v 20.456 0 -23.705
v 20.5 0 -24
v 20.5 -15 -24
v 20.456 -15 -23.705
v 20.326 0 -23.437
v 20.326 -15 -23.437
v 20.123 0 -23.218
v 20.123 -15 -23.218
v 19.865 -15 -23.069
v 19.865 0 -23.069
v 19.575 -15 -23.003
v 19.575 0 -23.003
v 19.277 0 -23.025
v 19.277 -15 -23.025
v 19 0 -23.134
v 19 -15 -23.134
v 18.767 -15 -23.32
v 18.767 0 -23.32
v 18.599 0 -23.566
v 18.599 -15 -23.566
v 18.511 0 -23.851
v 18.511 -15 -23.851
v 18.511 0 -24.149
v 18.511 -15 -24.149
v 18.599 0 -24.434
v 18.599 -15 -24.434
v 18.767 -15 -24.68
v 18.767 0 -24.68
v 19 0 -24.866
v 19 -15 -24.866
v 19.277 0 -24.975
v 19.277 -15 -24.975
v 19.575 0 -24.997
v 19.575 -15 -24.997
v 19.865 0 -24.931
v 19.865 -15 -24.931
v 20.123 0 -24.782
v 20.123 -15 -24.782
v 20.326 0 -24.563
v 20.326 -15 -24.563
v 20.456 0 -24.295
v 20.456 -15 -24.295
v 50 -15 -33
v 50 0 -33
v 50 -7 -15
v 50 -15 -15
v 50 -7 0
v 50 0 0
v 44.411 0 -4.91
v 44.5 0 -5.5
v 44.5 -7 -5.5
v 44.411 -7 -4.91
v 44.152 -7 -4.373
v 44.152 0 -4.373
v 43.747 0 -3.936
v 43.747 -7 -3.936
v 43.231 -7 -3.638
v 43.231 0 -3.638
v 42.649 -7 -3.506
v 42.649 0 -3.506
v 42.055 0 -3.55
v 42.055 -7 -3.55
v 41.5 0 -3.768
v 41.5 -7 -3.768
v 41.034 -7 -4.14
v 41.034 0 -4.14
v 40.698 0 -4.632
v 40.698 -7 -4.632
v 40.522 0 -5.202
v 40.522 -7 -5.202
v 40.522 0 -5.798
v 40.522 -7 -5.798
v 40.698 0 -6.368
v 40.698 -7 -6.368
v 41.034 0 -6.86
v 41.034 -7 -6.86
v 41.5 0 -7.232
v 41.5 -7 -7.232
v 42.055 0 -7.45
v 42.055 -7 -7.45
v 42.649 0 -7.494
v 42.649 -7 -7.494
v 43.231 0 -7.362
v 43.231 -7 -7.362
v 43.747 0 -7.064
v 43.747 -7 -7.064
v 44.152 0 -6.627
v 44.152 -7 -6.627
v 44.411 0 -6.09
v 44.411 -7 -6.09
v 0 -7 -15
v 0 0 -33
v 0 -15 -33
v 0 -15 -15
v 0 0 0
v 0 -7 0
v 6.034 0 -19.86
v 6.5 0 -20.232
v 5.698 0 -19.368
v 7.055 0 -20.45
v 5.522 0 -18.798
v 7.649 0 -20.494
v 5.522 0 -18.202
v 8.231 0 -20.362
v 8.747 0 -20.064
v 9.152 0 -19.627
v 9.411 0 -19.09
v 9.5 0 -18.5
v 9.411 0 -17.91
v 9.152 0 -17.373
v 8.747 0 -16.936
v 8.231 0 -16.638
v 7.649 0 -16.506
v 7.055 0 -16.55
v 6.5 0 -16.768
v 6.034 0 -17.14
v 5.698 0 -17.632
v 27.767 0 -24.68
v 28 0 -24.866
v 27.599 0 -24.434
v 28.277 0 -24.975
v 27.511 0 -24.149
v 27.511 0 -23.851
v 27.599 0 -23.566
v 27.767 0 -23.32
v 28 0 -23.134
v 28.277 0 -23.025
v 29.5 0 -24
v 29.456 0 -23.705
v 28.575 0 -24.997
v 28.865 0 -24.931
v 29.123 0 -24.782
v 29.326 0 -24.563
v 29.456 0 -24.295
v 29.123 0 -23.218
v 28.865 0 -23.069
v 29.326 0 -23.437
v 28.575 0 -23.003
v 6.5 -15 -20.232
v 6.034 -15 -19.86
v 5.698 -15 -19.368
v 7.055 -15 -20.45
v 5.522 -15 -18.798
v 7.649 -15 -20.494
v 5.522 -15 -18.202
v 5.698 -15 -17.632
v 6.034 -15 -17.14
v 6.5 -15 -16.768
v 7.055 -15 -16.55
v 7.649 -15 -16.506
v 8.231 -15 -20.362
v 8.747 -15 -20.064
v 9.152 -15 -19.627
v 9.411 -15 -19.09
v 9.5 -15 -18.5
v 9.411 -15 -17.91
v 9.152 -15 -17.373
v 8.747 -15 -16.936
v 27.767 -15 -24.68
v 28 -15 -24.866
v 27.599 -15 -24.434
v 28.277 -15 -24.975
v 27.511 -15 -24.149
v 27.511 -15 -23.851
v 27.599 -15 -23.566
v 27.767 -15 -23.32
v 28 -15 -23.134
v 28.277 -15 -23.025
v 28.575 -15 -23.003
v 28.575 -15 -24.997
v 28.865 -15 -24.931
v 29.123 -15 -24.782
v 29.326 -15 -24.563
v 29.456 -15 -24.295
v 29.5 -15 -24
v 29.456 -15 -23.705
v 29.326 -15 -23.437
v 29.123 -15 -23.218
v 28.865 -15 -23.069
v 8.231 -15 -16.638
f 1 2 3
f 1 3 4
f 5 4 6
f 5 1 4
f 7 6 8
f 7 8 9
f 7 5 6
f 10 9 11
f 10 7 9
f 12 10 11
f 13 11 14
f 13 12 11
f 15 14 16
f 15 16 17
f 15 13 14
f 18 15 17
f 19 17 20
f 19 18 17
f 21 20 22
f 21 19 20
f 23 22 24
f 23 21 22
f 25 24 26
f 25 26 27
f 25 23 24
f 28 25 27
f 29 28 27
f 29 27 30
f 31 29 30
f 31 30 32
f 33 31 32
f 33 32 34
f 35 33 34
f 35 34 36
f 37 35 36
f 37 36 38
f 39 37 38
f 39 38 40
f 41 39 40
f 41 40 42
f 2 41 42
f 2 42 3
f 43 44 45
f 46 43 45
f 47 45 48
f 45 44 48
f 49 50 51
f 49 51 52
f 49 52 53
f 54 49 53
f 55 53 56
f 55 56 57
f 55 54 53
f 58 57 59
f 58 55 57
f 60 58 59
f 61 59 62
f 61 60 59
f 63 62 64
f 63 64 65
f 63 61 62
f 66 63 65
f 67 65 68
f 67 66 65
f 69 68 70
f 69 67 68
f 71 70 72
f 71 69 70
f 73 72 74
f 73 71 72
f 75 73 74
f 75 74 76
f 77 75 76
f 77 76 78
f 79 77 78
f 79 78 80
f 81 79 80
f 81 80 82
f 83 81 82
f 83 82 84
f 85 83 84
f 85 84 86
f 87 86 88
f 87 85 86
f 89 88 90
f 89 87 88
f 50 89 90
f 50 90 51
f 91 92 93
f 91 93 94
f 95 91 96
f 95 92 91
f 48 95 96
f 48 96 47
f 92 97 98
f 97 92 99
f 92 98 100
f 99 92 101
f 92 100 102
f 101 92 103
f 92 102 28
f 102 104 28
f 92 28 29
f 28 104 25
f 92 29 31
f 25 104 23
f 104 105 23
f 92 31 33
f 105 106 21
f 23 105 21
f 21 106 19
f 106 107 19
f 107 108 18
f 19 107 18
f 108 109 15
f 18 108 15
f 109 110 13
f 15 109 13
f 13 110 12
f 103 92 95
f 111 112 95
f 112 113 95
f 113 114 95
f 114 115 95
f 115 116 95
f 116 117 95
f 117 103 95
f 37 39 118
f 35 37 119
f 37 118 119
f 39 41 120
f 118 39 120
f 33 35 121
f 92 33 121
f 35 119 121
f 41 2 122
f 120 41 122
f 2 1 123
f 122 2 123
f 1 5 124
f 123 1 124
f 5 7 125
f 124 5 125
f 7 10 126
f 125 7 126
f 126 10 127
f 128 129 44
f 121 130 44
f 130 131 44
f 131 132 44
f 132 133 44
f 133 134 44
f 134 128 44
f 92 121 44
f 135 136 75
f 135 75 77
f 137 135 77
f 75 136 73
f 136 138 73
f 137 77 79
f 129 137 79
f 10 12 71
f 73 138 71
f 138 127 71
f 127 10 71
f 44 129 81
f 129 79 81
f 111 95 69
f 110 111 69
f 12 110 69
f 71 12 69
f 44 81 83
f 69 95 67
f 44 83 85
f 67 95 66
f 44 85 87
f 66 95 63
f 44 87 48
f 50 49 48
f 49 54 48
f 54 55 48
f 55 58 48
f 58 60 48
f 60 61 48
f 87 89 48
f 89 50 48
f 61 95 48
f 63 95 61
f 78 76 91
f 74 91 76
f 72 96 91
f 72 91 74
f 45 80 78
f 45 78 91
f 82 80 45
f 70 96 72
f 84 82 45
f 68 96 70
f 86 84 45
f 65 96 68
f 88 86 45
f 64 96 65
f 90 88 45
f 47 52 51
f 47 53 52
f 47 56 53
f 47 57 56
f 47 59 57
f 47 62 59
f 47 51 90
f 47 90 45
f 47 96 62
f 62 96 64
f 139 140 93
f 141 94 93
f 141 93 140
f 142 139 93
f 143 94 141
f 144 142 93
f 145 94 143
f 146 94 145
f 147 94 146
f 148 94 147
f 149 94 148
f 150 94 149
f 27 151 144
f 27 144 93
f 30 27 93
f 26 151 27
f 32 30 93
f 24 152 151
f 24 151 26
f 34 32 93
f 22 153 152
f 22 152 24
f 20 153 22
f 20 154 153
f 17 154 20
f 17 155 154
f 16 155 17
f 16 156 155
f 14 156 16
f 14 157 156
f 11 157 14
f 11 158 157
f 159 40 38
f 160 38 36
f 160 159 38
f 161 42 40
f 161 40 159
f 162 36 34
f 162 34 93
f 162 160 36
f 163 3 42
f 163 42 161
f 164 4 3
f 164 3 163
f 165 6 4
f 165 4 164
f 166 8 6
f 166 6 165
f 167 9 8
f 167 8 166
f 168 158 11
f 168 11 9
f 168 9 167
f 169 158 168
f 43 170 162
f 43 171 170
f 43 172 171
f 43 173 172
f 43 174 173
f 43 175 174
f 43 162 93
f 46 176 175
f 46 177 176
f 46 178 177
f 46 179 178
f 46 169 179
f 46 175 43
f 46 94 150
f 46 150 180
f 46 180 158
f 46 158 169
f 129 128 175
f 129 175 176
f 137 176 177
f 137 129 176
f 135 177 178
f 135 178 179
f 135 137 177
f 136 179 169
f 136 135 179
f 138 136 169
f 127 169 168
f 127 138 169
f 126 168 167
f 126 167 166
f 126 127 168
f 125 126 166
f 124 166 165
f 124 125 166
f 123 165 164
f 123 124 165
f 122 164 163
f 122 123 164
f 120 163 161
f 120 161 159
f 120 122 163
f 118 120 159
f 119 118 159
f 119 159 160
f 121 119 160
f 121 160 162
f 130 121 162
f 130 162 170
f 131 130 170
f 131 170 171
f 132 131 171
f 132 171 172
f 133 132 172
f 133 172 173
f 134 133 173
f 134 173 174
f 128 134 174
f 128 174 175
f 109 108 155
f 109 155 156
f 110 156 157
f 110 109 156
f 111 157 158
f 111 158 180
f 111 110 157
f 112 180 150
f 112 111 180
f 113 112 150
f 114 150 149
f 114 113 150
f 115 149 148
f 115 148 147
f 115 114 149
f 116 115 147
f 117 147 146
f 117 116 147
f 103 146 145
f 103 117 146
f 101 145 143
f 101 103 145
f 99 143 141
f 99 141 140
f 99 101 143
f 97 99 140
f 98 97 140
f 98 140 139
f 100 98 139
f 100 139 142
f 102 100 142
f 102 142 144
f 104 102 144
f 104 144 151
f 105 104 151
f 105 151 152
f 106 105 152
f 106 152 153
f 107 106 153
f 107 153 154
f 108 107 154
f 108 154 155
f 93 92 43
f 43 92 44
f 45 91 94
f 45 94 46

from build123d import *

# Parameters (mm, degrees)
F0_W     = 50
F0_H     = 33
F0_R     = 2
F0_R_2   = 1
F1_DEPTH = 7
F2_W     = 50
F2_H     = 18
F2_R     = 1
F2_R_2   = 2
F3_DEPTH = 15


with BuildPart() as f1:
    # F0 (on Front) → F1 (new body)
    with BuildSketch(Plane.XZ):
        with Locations((25, -16.5)):
            Rectangle(F0_W, F0_H)
        with Locations((7.5, -18.5)):
            Circle(F0_R, mode=Mode.SUBTRACT)
        with Locations((19.5, -24)):
            Circle(F0_R_2, mode=Mode.SUBTRACT)
        with Locations((28.5, -24)):
            Circle(F0_R_2, mode=Mode.SUBTRACT)
        with Locations((42.5, -5.5)):
            Circle(F0_R, mode=Mode.SUBTRACT)
    extrude(amount=F1_DEPTH)

    # F2 (on Front) → F3 (join)
    with BuildSketch(Plane.XZ):
        with Locations((25, -24)):
            Rectangle(F2_W, F2_H)
        with Locations((19.5, -24)):
            Circle(F2_R, mode=Mode.SUBTRACT)
        with Locations((7.5, -18.5)):
            Circle(F2_R_2, mode=Mode.SUBTRACT)
        with Locations((28.5, -24)):
            Circle(F2_R, mode=Mode.SUBTRACT)
    extrude(amount=F3_DEPTH)


solid = f1.part
